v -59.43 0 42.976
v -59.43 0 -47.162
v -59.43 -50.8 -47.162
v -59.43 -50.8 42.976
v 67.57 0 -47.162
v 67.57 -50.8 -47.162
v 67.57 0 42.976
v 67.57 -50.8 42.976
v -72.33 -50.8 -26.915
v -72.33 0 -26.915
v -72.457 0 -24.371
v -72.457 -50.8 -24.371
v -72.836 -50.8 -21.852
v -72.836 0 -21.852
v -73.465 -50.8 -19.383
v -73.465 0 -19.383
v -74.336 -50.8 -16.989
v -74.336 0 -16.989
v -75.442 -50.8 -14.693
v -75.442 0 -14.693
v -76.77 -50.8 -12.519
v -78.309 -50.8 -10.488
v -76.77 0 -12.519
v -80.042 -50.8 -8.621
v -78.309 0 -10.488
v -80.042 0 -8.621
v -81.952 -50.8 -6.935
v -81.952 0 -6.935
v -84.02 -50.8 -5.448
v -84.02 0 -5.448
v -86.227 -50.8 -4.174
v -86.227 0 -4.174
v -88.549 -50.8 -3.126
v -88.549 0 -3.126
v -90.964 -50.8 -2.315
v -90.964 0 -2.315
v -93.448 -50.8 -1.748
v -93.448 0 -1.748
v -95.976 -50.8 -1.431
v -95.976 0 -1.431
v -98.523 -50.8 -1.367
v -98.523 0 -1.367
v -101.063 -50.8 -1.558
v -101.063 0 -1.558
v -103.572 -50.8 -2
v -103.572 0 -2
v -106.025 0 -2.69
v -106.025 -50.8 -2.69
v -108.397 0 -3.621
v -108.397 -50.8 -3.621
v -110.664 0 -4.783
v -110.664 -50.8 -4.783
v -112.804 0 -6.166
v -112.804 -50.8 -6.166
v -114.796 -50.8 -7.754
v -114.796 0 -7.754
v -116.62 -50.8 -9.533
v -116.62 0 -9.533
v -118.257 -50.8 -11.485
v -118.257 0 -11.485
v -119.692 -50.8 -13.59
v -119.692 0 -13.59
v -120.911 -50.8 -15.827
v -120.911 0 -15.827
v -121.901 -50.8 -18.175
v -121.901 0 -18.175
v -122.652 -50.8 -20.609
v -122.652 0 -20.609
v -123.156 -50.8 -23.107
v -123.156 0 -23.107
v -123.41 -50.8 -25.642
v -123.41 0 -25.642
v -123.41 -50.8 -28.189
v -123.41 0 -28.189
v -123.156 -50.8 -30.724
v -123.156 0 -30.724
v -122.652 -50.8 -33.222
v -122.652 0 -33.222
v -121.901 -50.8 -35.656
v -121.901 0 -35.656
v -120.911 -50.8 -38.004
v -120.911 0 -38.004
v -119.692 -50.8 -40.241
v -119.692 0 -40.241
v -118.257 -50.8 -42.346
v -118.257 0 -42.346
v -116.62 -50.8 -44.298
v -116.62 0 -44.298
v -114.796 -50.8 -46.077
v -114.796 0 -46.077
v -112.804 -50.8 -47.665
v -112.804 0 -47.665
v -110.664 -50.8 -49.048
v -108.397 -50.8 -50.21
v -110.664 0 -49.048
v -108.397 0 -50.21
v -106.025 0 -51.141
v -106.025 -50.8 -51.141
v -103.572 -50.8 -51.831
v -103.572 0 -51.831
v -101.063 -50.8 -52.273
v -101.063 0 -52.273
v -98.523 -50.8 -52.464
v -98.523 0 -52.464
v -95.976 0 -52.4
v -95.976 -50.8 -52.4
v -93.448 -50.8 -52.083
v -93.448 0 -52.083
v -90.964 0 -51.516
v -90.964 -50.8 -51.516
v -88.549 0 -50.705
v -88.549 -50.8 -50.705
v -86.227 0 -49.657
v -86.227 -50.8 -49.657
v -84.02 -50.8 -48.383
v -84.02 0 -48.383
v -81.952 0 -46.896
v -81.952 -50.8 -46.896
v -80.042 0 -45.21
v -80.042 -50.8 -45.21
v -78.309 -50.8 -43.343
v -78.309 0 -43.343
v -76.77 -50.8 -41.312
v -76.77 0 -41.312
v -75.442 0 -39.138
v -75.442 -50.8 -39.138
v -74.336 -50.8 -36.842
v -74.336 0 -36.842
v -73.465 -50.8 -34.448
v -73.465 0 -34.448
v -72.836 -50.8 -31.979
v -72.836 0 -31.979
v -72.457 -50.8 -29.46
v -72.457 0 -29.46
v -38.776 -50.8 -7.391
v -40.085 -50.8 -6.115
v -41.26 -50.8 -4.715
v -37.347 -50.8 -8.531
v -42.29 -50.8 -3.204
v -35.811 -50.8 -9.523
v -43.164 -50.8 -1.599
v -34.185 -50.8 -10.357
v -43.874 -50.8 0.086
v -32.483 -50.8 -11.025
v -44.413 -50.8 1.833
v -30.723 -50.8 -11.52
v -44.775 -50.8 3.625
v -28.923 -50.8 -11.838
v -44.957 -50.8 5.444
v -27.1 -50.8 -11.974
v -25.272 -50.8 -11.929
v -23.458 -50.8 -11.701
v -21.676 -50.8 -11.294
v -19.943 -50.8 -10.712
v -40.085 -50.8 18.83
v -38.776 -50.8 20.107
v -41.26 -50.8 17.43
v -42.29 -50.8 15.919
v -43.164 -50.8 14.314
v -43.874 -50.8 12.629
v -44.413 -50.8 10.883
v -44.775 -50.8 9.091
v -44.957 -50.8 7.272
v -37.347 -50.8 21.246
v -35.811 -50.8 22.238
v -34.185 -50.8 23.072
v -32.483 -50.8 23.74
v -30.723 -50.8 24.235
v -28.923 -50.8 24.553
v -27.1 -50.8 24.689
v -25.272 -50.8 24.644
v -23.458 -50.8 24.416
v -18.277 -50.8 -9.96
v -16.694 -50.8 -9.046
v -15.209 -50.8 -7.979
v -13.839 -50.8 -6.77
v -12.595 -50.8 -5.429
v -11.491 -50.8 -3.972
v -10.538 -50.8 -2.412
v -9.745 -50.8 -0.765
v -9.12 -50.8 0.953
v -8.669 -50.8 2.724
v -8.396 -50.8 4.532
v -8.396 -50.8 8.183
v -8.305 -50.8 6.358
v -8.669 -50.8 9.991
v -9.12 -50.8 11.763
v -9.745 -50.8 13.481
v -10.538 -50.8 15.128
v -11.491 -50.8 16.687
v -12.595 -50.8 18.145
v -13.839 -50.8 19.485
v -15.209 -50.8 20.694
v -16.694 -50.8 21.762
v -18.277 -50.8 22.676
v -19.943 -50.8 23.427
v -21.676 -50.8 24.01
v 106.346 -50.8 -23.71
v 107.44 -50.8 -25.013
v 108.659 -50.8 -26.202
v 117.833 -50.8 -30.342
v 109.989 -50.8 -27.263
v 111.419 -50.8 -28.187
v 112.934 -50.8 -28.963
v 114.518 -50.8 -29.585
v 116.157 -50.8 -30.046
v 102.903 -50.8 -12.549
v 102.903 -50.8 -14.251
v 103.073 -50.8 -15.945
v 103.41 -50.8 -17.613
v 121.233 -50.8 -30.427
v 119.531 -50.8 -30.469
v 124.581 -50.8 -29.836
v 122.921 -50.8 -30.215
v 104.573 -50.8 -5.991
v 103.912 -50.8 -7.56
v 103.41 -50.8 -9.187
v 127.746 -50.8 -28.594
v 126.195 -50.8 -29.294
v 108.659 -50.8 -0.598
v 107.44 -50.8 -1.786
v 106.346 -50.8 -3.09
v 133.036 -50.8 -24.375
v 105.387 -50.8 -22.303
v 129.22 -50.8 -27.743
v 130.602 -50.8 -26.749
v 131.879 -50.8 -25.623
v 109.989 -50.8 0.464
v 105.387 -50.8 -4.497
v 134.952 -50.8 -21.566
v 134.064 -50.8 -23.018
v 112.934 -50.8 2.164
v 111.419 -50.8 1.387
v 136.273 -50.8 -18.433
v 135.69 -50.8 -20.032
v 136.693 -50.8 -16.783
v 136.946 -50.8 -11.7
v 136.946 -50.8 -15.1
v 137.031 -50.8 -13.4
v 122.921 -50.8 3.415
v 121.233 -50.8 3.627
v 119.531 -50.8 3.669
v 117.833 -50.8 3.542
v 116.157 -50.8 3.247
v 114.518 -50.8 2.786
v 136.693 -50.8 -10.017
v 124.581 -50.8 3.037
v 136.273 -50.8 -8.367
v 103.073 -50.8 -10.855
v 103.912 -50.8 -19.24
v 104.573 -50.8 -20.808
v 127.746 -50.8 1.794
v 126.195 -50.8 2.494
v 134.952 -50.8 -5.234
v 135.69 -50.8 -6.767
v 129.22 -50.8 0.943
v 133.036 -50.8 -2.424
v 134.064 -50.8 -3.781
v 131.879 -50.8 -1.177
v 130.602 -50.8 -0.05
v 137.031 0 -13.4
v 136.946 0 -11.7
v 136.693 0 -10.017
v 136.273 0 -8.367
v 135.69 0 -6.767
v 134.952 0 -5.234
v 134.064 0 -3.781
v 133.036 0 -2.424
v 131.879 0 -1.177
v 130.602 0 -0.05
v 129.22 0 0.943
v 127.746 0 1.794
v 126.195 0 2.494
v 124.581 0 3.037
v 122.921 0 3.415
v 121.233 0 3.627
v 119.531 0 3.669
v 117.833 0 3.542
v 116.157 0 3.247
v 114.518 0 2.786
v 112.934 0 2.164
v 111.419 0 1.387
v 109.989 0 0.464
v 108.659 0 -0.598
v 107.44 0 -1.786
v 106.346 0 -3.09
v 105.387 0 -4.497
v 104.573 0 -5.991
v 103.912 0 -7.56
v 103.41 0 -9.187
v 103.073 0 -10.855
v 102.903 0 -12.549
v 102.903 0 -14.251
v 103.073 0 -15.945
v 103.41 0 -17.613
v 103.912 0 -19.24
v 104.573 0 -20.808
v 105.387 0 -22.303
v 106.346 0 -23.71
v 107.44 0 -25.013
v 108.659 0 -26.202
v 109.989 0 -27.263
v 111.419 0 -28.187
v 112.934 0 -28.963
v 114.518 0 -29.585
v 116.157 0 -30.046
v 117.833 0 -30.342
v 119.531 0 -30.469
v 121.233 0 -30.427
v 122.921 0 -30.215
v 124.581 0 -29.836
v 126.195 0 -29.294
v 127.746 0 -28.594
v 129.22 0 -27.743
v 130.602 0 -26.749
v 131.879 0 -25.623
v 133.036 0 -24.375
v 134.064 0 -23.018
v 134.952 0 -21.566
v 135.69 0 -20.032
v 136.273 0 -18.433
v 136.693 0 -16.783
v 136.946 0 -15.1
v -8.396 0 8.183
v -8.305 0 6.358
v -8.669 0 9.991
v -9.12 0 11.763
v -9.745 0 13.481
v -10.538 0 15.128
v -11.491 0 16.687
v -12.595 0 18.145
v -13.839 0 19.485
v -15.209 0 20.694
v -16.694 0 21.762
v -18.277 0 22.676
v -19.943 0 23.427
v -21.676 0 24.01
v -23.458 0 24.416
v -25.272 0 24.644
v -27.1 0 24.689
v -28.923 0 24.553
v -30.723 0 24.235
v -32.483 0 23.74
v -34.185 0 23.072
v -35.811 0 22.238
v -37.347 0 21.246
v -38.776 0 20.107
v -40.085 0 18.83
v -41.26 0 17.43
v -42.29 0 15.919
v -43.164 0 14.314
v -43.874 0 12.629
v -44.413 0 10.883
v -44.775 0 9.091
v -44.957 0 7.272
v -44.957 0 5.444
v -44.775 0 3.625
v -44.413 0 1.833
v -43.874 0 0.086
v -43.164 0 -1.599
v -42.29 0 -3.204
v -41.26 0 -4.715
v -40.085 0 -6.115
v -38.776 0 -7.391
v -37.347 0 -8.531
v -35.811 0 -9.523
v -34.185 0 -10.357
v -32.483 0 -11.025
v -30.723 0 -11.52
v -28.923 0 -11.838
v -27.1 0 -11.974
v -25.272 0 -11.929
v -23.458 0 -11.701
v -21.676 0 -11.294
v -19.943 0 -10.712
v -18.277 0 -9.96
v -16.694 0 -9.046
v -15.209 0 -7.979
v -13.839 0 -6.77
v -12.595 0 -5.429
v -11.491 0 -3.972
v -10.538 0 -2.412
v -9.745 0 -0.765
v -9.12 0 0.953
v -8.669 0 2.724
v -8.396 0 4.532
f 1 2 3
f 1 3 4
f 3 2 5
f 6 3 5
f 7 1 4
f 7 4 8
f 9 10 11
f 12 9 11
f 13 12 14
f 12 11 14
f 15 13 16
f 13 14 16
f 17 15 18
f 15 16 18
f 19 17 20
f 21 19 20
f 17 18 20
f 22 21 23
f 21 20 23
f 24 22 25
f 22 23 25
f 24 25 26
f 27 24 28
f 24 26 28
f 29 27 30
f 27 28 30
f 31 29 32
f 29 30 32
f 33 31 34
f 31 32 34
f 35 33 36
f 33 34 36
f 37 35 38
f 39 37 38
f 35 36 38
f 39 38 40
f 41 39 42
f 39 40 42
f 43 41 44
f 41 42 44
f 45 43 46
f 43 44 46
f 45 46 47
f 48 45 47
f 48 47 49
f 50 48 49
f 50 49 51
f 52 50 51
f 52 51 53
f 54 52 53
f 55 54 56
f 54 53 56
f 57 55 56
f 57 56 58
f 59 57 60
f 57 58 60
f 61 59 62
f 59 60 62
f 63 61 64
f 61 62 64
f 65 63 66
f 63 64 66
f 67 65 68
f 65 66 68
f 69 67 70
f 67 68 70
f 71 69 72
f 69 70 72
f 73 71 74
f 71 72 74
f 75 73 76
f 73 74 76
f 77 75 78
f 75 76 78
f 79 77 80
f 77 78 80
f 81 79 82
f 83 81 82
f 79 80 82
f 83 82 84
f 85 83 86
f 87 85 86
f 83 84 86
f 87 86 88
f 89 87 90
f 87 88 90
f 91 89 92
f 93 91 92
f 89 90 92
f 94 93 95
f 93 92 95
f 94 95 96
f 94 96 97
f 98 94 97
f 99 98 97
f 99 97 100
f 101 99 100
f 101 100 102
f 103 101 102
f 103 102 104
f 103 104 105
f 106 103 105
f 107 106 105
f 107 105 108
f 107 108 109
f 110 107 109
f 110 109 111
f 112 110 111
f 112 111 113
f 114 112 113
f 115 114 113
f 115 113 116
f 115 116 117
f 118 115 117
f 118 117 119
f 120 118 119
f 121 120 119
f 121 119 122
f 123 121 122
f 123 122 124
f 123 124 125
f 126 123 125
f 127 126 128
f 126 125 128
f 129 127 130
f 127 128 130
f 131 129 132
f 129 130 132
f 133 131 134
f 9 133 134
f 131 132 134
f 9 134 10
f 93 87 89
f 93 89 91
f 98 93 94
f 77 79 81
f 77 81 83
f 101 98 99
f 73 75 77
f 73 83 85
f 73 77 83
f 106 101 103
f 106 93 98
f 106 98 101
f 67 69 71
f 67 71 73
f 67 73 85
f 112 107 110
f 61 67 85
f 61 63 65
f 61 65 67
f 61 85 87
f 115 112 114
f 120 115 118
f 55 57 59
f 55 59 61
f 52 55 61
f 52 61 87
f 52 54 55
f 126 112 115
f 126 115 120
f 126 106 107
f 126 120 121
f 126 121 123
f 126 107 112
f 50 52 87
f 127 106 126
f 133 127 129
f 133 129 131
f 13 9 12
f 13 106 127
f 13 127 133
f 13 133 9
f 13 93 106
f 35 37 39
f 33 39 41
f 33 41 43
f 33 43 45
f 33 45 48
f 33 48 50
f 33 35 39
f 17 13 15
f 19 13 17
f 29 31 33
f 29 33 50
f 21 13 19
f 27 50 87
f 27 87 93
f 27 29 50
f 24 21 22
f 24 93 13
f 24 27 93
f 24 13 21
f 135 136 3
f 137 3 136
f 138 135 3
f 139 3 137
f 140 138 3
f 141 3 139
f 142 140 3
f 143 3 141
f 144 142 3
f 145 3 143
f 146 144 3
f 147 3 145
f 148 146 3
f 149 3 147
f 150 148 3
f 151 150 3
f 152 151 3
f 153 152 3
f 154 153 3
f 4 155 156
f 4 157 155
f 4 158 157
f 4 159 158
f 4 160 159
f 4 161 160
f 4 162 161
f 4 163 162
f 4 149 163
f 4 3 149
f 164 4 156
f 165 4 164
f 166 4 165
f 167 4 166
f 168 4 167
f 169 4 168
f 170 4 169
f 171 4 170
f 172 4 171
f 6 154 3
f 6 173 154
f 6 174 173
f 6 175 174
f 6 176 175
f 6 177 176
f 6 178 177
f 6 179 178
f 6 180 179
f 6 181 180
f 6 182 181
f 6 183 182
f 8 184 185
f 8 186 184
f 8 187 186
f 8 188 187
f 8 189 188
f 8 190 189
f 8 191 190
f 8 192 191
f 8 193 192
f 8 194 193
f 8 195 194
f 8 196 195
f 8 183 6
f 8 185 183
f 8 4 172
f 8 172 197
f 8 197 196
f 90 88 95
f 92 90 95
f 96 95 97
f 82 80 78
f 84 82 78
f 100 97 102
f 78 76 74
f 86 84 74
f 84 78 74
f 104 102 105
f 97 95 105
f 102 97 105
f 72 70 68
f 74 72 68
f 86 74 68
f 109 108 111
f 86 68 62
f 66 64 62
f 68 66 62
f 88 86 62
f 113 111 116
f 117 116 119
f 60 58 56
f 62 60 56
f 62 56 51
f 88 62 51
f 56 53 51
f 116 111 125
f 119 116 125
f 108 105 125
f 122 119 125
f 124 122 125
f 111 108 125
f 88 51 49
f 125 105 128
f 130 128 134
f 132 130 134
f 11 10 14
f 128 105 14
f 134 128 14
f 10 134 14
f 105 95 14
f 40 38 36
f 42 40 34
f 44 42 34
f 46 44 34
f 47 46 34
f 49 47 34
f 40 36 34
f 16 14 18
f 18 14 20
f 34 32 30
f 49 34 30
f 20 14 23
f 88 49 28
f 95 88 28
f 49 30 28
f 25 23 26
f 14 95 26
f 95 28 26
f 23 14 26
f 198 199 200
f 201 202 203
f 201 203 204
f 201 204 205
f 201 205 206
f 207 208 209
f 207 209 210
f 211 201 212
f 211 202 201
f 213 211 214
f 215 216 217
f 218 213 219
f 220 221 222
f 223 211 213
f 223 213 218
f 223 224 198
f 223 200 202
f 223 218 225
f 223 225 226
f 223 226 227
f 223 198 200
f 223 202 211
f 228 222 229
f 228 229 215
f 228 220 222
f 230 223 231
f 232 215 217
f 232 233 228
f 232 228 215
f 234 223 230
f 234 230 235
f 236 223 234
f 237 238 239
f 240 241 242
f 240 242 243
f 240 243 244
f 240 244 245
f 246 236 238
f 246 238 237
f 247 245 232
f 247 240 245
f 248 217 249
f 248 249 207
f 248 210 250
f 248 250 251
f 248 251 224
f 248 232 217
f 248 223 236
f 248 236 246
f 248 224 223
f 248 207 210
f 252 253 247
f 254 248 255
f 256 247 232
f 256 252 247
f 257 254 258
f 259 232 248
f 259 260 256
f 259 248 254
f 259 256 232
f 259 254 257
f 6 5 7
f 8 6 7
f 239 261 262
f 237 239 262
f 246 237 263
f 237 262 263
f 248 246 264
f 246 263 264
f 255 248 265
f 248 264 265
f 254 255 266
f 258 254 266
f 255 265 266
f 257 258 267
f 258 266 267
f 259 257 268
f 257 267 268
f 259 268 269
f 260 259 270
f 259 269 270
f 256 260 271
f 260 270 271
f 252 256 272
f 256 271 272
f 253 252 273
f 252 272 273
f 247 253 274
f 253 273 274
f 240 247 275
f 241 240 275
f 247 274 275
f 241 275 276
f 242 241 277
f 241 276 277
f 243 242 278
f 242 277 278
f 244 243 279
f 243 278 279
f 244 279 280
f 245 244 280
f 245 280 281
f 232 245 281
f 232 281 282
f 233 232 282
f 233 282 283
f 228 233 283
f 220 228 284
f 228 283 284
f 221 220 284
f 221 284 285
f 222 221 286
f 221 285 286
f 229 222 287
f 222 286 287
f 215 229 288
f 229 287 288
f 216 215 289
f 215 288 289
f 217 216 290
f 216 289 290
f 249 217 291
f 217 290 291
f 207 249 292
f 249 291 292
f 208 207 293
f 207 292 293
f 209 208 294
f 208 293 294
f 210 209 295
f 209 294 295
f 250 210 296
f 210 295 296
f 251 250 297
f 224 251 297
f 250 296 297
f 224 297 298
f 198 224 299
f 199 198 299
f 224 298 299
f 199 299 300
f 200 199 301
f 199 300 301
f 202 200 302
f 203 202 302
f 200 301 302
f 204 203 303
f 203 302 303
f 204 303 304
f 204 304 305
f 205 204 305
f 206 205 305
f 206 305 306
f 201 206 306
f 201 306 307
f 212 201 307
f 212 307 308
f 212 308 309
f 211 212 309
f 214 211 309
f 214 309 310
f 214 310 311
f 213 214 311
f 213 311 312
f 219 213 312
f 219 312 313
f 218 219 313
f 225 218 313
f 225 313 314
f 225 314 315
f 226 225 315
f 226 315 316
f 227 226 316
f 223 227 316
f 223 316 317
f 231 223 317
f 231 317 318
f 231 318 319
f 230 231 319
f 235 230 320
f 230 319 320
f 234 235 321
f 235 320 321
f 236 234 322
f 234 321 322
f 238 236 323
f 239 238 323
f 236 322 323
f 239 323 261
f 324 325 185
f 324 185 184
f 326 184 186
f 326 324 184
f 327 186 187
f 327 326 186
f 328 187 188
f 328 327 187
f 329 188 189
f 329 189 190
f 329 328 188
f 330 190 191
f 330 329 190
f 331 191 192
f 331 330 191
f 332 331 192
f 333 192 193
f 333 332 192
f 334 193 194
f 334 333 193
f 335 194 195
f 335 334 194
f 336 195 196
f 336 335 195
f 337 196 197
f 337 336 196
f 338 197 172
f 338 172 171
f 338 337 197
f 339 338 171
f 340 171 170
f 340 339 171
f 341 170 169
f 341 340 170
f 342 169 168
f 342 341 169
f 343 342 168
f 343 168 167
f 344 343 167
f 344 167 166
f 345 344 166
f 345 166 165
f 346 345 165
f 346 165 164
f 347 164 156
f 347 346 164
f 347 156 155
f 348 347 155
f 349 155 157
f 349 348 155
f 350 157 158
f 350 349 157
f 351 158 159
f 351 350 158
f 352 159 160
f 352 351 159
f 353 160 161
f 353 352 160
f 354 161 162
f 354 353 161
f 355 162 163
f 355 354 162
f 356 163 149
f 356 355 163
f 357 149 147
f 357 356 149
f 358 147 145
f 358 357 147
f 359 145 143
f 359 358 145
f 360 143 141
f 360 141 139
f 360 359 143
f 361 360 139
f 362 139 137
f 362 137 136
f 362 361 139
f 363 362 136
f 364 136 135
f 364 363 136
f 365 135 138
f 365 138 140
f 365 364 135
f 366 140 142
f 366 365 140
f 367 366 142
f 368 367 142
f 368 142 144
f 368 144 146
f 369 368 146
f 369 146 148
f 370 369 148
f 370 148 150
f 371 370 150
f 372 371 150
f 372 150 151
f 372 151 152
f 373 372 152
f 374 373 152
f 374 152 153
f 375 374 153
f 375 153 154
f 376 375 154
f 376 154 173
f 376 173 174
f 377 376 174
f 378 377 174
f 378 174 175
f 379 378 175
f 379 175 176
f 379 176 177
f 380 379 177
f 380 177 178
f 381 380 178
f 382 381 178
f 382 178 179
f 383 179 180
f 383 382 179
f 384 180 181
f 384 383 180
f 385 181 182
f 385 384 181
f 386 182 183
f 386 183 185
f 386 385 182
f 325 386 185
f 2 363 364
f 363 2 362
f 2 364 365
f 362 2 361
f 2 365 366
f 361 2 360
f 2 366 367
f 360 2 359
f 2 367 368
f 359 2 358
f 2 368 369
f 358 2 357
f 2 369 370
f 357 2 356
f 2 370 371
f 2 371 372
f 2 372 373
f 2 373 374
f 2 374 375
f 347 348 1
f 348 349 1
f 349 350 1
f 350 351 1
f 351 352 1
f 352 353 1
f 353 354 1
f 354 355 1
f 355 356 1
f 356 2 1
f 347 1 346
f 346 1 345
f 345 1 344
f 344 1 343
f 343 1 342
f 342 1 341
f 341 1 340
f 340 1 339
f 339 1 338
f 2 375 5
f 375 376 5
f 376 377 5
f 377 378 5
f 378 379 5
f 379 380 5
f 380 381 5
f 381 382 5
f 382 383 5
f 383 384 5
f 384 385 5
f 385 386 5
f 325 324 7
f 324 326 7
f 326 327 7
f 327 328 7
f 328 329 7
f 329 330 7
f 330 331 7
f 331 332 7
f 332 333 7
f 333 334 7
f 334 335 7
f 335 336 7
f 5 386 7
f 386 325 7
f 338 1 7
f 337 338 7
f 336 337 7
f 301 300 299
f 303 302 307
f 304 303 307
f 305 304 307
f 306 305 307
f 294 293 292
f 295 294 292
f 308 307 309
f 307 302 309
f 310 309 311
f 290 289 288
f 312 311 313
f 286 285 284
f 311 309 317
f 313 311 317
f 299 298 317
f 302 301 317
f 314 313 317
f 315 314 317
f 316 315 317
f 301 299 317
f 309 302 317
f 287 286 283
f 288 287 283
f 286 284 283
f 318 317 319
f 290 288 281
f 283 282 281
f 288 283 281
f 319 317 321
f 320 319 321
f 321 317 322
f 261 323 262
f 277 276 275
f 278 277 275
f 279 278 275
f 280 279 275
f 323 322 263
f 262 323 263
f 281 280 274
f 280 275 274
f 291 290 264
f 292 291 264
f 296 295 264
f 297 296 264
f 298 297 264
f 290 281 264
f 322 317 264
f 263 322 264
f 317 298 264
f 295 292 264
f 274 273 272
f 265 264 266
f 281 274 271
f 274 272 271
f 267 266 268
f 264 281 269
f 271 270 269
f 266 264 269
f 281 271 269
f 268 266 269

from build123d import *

# Parameters (mm, degrees)
F0_W     = 127
F0_H     = 90.137711
F0_R     = 18.337464
F0_R_2   = 25.556072
F0_R_3   = 17.074572
F1_DEPTH = 50.8


with BuildPart() as f1:
    # F0 (on Front) → F1 (new body)
    with BuildSketch(Plane.XZ):
        with Locations((4.070276, -2.093283)):
            Rectangle(F0_W, F0_H)
        with Locations((-26.642586, 6.3576)):
            Circle(F0_R, mode=Mode.SUBTRACT)
        with Locations((-97.885694, -26.915475)):
            Circle(F0_R_2)
        with Locations((119.95652, -13.399819)):
            Circle(F0_R_3)
    extrude(amount=F1_DEPTH)


solid = f1.part
